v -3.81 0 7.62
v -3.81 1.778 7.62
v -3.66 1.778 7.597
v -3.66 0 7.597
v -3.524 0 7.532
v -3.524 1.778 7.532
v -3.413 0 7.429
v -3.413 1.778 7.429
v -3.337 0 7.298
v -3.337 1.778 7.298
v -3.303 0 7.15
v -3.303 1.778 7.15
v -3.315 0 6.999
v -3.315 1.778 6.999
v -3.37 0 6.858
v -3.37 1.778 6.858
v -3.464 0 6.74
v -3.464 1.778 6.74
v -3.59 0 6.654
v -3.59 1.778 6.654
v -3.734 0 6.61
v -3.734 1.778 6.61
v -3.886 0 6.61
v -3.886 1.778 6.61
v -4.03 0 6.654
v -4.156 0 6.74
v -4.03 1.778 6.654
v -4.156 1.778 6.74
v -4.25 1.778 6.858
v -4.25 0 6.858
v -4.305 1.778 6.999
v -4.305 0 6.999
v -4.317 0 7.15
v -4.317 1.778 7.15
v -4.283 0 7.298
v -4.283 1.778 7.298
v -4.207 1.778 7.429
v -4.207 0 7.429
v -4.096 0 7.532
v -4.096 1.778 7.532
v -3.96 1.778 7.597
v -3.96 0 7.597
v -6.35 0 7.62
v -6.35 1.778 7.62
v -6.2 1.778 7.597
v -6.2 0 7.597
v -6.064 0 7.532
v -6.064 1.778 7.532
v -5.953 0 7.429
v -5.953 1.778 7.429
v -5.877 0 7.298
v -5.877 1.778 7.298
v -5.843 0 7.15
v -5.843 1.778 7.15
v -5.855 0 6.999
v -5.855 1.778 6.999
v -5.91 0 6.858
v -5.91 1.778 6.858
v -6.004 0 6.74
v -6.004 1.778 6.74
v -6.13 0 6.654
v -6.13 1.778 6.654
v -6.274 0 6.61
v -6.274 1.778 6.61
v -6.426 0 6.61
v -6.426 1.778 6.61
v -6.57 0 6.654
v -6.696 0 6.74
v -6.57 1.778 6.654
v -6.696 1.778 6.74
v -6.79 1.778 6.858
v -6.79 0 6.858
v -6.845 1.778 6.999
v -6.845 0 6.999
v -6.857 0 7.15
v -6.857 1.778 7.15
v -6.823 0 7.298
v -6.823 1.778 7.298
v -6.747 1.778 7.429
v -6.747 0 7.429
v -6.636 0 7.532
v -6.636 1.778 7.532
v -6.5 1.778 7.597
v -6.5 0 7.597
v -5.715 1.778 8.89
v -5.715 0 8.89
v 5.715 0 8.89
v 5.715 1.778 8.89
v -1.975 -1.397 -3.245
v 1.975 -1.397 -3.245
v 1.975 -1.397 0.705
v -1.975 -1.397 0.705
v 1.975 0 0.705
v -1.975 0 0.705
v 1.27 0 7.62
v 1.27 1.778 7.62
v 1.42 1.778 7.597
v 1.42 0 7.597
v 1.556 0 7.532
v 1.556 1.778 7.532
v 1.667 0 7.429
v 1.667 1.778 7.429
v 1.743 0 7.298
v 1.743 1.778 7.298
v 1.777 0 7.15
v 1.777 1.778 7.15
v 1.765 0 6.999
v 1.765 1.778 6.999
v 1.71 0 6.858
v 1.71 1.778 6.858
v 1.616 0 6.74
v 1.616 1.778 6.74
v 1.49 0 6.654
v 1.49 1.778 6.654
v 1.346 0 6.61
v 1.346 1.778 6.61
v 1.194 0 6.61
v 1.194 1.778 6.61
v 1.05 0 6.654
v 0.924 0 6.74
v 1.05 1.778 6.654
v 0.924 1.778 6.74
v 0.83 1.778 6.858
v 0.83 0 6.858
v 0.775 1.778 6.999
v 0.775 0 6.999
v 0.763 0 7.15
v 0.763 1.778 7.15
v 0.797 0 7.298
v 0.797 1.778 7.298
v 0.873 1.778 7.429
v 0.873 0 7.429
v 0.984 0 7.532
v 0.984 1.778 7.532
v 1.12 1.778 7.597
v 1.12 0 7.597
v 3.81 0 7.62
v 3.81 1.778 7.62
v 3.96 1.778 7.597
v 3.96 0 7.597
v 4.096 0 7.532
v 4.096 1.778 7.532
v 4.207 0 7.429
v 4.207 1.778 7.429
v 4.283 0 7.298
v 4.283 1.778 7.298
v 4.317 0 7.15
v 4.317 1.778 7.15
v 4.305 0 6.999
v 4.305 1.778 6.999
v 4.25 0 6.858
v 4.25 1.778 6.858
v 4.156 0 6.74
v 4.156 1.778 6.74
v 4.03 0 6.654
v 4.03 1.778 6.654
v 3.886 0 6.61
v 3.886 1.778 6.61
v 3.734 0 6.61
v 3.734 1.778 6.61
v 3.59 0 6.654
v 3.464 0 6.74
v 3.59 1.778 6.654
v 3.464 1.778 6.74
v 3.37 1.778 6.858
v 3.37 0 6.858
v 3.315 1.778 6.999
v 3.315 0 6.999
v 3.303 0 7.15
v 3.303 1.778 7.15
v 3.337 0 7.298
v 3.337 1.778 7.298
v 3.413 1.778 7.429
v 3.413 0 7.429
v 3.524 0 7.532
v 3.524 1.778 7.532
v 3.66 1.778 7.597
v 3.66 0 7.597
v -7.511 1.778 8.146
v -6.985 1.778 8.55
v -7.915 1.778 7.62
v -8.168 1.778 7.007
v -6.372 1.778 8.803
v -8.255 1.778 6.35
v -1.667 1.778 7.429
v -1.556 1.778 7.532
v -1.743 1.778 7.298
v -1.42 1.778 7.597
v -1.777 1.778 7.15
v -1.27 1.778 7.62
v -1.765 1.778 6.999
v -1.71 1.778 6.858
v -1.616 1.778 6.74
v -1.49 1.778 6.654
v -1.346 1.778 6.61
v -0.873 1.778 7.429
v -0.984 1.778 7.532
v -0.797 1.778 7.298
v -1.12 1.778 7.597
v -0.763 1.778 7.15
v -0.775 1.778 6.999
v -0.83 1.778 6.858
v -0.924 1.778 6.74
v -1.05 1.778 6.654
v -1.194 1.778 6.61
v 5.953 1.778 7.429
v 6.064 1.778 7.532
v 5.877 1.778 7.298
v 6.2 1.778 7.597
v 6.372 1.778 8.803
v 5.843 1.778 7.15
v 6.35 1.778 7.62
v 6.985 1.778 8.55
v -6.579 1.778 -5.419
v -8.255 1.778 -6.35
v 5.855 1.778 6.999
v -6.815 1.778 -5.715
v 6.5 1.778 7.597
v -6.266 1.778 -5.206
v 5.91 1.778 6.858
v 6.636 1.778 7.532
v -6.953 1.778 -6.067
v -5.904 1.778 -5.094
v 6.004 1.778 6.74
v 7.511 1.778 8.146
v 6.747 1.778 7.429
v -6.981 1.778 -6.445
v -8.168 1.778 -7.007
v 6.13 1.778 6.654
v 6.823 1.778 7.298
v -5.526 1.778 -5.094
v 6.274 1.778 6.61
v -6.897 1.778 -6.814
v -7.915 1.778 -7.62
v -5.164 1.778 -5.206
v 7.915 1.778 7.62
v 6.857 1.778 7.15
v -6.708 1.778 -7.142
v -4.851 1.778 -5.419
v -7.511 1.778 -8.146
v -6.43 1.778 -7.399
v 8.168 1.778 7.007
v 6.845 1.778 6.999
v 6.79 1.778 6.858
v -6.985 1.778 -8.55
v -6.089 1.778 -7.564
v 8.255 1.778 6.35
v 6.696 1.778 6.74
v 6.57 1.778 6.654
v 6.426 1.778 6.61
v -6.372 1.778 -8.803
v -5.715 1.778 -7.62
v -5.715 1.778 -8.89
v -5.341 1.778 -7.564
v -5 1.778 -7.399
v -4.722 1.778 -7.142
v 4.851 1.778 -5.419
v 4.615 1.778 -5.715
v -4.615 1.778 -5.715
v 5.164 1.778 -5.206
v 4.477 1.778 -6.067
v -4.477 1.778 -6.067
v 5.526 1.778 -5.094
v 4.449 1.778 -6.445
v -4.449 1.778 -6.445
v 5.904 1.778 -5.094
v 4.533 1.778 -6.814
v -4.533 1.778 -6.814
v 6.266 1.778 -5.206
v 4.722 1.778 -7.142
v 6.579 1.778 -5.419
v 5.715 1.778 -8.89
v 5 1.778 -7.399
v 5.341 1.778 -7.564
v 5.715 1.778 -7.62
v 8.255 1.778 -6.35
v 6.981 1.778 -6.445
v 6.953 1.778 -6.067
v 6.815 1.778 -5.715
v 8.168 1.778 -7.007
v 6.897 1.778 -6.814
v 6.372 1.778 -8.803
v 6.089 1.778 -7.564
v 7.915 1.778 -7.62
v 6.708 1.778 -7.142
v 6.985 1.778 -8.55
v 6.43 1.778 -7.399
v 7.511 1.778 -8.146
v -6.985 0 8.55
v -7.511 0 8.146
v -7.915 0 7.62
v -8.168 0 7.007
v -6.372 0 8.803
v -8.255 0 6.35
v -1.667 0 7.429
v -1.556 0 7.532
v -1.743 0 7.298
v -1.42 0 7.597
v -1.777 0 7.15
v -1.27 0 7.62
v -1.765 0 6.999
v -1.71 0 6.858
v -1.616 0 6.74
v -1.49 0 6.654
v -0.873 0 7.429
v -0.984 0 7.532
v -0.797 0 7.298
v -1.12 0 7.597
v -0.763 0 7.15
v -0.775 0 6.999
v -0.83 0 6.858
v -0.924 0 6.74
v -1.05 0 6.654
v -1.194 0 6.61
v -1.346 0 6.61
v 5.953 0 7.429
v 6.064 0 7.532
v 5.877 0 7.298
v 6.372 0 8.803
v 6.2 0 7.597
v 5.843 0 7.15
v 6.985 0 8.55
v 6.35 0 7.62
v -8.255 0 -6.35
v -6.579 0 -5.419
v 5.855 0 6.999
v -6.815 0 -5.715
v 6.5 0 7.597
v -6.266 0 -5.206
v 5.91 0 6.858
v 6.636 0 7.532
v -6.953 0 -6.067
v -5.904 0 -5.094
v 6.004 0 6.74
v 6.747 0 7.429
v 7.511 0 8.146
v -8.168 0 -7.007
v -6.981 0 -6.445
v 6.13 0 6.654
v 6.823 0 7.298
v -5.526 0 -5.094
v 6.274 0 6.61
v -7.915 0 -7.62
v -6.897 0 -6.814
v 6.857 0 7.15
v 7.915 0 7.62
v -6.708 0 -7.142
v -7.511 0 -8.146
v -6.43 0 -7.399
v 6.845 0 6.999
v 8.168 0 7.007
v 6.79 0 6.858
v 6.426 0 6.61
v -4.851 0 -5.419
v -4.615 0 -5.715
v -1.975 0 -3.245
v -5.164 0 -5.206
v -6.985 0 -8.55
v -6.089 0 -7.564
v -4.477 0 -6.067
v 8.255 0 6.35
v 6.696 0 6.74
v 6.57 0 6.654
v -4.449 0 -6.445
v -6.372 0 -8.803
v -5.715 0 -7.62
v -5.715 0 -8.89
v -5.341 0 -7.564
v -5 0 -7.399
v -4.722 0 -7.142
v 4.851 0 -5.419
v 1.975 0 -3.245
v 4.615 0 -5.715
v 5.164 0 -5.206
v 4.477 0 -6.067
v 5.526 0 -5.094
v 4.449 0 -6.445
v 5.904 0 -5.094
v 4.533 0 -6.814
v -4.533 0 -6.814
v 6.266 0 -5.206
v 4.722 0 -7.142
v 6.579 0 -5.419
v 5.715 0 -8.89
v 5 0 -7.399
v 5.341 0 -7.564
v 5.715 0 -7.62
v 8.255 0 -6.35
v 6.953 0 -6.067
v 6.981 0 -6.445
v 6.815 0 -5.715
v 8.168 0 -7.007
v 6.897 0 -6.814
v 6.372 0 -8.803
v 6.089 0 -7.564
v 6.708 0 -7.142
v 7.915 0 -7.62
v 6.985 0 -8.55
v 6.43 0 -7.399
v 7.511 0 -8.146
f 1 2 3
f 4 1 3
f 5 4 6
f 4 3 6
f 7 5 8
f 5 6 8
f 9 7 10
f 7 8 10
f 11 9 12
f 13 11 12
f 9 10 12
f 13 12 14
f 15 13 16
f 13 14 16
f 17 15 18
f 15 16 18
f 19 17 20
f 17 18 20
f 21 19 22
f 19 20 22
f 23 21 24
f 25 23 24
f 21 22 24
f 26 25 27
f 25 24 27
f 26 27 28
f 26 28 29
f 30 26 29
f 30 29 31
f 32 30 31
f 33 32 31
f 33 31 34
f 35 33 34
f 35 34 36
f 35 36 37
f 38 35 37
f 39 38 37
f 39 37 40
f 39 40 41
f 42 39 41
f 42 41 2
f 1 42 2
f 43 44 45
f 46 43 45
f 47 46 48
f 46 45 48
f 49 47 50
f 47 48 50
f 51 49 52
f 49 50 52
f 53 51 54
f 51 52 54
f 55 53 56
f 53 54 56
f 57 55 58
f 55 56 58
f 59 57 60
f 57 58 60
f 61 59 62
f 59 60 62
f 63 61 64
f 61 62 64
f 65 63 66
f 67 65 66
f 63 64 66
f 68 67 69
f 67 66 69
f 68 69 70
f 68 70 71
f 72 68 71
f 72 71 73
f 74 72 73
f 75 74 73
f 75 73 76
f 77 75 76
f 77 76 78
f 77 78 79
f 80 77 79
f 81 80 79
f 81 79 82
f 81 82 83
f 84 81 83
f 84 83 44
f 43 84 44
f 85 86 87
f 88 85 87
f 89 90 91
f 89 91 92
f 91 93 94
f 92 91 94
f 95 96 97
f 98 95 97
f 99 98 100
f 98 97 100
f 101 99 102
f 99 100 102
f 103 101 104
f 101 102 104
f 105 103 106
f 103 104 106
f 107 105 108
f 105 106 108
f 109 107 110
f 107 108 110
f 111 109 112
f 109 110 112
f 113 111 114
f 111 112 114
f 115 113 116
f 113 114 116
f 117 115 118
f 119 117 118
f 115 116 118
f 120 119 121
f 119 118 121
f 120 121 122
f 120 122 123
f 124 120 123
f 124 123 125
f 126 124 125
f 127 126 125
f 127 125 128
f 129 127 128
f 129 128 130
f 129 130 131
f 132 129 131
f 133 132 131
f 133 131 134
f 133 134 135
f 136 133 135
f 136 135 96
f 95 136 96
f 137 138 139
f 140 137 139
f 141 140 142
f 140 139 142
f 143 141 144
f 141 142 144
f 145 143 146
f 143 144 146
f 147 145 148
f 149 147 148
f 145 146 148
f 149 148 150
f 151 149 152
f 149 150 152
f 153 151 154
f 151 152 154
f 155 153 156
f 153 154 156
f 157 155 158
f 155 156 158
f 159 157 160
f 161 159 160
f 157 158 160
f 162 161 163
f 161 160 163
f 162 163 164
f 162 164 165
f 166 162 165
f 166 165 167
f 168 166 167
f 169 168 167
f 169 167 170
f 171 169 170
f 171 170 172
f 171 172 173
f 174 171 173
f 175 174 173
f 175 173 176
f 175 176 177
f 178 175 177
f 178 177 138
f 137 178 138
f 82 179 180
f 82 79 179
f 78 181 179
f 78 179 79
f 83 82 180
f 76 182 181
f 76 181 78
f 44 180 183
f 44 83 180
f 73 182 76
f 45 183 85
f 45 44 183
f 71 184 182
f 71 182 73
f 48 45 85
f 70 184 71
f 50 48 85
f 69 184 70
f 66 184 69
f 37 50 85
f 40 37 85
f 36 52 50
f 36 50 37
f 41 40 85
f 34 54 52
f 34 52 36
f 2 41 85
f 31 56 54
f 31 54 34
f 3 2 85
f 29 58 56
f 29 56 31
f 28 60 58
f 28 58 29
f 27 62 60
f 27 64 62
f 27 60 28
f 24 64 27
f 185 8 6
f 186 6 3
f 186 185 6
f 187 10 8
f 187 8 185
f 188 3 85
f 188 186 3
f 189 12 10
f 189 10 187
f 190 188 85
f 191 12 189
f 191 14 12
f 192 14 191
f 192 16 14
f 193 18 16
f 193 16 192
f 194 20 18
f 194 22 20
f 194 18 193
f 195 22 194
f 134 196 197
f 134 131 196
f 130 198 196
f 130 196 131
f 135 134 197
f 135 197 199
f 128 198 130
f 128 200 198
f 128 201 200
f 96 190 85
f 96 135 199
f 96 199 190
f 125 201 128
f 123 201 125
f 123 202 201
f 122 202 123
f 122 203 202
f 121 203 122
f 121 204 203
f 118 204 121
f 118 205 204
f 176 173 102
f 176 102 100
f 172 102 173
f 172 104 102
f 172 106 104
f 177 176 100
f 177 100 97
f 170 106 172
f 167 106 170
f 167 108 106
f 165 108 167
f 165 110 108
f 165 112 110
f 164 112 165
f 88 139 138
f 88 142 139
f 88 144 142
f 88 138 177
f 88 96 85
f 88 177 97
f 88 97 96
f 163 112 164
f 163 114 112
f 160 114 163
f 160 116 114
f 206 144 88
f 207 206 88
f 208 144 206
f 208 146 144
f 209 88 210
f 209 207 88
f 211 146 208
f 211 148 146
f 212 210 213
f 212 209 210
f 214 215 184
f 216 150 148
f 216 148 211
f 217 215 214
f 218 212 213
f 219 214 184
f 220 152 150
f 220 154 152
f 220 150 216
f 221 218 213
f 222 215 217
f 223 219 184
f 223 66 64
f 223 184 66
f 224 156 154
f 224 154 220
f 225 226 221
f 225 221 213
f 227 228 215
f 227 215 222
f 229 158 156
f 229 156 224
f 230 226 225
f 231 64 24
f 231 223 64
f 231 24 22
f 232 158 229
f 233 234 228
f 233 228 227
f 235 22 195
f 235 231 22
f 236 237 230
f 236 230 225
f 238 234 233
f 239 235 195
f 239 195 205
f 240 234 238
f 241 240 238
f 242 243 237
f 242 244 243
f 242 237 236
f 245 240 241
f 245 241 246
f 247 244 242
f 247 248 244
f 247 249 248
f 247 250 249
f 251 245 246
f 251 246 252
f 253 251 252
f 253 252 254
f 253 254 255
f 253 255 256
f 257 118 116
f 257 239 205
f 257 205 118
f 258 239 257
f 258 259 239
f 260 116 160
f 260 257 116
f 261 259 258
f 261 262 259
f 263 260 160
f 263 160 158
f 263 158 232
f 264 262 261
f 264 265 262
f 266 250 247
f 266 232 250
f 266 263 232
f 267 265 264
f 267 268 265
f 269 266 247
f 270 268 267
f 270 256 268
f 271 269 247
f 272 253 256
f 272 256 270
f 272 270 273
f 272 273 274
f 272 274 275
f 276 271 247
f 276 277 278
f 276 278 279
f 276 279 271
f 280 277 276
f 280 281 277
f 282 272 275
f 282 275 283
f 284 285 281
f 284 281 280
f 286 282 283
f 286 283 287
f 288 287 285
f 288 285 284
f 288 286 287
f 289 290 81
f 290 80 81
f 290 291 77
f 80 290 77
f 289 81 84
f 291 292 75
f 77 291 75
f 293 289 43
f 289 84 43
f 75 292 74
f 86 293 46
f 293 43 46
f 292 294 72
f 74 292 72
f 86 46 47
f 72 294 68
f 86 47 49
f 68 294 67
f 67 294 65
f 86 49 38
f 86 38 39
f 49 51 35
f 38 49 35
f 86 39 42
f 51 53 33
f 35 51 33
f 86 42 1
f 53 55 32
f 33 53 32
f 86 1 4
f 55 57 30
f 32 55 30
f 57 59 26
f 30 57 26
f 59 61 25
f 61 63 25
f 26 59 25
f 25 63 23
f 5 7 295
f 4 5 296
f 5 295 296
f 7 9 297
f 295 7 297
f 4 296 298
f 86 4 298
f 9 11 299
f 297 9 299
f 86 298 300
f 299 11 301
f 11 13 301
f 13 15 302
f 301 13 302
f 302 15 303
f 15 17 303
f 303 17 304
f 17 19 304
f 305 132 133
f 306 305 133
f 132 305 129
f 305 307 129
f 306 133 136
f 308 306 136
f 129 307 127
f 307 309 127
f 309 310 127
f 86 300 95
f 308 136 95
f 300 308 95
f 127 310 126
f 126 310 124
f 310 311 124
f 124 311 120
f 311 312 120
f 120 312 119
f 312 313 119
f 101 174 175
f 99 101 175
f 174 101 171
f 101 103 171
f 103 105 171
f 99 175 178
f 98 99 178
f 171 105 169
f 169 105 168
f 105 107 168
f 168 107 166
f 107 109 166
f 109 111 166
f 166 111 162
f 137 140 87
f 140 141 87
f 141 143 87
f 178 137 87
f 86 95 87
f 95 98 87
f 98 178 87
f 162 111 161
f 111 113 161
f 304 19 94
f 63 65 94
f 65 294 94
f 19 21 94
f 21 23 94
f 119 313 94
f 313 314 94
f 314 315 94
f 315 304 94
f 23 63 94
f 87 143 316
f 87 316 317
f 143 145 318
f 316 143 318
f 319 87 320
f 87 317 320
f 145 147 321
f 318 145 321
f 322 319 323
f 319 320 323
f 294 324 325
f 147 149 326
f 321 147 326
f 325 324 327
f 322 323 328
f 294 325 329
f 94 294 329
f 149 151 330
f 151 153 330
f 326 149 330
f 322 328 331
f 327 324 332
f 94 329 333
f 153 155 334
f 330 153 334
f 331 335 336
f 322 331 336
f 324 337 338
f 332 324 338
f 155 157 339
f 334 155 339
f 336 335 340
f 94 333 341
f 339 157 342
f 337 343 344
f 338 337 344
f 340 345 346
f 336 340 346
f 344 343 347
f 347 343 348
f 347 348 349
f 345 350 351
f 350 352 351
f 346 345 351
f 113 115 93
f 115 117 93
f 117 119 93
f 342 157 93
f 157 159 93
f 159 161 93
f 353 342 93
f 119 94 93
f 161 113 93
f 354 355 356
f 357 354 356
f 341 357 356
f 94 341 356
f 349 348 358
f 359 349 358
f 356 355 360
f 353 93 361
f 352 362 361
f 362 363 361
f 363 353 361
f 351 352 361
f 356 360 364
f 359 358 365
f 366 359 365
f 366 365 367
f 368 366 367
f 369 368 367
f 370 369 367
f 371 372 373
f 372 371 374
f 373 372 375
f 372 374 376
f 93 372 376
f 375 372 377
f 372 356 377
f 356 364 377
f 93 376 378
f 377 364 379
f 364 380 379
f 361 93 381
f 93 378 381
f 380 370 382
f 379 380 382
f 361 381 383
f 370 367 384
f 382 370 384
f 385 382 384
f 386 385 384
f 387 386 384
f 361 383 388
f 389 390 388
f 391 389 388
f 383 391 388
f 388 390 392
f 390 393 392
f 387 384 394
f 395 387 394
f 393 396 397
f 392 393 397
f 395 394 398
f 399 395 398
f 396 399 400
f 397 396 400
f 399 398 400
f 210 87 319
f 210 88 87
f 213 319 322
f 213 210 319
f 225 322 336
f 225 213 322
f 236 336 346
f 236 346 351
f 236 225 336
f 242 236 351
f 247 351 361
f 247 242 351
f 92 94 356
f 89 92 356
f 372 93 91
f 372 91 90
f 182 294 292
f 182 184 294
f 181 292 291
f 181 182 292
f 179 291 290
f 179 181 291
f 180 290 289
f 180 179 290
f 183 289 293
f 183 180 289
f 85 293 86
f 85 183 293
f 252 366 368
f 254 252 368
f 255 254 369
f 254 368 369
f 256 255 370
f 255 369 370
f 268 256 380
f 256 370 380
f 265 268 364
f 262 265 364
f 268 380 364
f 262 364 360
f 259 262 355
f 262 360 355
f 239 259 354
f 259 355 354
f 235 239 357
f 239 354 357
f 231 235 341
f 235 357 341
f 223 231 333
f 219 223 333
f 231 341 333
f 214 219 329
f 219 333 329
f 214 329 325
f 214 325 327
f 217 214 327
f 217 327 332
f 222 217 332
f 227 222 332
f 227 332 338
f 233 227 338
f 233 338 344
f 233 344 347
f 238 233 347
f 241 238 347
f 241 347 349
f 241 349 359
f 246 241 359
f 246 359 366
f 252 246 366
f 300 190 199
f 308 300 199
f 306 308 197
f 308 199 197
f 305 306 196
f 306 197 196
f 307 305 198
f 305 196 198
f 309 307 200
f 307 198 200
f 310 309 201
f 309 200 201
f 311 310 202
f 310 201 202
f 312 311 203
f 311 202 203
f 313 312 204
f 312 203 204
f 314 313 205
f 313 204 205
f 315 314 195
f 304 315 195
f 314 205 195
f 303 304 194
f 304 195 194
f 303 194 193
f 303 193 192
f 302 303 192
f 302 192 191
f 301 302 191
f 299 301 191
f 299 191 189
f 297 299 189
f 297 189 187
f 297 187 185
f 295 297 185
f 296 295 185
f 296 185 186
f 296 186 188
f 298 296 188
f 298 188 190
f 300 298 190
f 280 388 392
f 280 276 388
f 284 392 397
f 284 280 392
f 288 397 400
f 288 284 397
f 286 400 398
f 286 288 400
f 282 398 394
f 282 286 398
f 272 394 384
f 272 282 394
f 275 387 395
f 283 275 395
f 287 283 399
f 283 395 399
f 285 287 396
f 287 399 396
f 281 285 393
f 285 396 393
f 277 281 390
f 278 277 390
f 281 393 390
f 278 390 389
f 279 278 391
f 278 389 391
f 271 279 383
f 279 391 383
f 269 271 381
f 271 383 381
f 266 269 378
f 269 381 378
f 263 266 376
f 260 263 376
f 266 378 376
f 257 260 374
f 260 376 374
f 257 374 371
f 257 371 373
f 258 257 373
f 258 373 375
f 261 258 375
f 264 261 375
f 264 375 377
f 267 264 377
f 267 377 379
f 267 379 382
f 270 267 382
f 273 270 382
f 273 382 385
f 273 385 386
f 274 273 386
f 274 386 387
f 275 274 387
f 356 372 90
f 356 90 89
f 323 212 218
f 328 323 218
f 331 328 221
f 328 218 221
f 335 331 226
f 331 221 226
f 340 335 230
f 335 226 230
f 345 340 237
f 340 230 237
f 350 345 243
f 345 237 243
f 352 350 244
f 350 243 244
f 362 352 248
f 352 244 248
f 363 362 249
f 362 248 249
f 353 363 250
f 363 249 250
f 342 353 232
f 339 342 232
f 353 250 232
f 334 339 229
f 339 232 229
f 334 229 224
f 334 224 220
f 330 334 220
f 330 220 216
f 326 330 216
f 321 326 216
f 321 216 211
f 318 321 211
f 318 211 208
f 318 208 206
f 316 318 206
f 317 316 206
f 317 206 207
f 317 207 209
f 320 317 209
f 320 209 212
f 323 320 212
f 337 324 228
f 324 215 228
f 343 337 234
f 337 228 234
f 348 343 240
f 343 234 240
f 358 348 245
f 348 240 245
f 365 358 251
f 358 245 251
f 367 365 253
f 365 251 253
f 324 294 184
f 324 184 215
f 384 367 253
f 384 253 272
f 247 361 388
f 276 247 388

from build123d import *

# Parameters (mm, degrees)
SKETCH1_W           = 16.51
SKETCH1_H           = 17.78
BOSS_EXTRUDE1_DEPTH = 1.778
FILLET1_R           = 2.54
CUT_EXTRUDE1_REACH  = 14.261
SKETCH2_R           = 0.508
SKETCH4_W           = 3.95
SKETCH4_H           = 3.95
BOSS_EXTRUDE3_DEPTH = 1.397
CUT_EXTRUDE2_REACH  = 14.261
SKETCH5_R           = 1.27


with BuildPart() as part:
    # Sketch1 → Boss-Extrude1 (new body)
    with BuildSketch(Plane(origin=(0, 0, 0), x_dir=(1, 0, 0), z_dir=(0, 1, 0))):
        Rectangle(SKETCH1_W, SKETCH1_H)
    extrude(amount=BOSS_EXTRUDE1_DEPTH)

    # Fillet1
    fillet1_edges = [part.edges().sort_by_distance(p)[0] for p in [
        (8.255, 0.889, 8.89),
        (-8.255, 0.889, 8.89),
        (-8.255, 0.889, -8.89),
        (8.255, 0.889, -8.89),
    ]]
    fillet(fillet1_edges, radius=FILLET1_R)

    # Sketch2 → Cut-Extrude1 (cut, up to next)
    with BuildSketch(Plane(origin=(0, 1.778, 0), x_dir=(1, 0, 0), z_dir=(0, 1, 0)), mode=Mode.PRIVATE) as cut_extrude1_sk1:
        with Locations(Location((-6.35, -7.112, 0), (0, 0, 270))):
            Circle(SKETCH2_R)
    cut_extrude1_tool1 = extrude(cut_extrude1_sk1.sketch, amount=-CUT_EXTRUDE1_REACH, mode=Mode.PRIVATE) & part.part
    # Sketch2 → Cut-Extrude1 (cut, up to next)
    with BuildSketch(Plane(origin=(0, 1.778, 0), x_dir=(1, 0, 0), z_dir=(0, 1, 0)), mode=Mode.PRIVATE) as cut_extrude1_sk2:
        with Locations(Location((-3.81, -7.112, 0), (0, 0, 270))):
            Circle(SKETCH2_R)
    cut_extrude1_tool2 = extrude(cut_extrude1_sk2.sketch, amount=-CUT_EXTRUDE1_REACH, mode=Mode.PRIVATE) & part.part
    # Sketch2 → Cut-Extrude1 (cut, up to next)
    with BuildSketch(Plane(origin=(0, 1.778, 0), x_dir=(1, 0, 0), z_dir=(0, 1, 0)), mode=Mode.PRIVATE) as cut_extrude1_sk3:
        with Locations(Location((-1.27, -7.112, 0), (0, 0, 270))):
            Circle(SKETCH2_R)
    cut_extrude1_tool3 = extrude(cut_extrude1_sk3.sketch, amount=-CUT_EXTRUDE1_REACH, mode=Mode.PRIVATE) & part.part
    # Sketch2 → Cut-Extrude1 (cut, up to next)
    with BuildSketch(Plane(origin=(0, 1.778, 0), x_dir=(1, 0, 0), z_dir=(0, 1, 0)), mode=Mode.PRIVATE) as cut_extrude1_sk4:
        with Locations(Location((1.27, -7.112, 0), (0, 0, 270))):
            Circle(SKETCH2_R)
    cut_extrude1_tool4 = extrude(cut_extrude1_sk4.sketch, amount=-CUT_EXTRUDE1_REACH, mode=Mode.PRIVATE) & part.part
    # Sketch2 → Cut-Extrude1 (cut, up to next)
    with BuildSketch(Plane(origin=(0, 1.778, 0), x_dir=(1, 0, 0), z_dir=(0, 1, 0)), mode=Mode.PRIVATE) as cut_extrude1_sk5:
        with Locations(Location((3.81, -7.112, 0), (0, 0, 270))):
            Circle(SKETCH2_R)
    cut_extrude1_tool5 = extrude(cut_extrude1_sk5.sketch, amount=-CUT_EXTRUDE1_REACH, mode=Mode.PRIVATE) & part.part
    # Sketch2 → Cut-Extrude1 (cut, up to next)
    with BuildSketch(Plane(origin=(0, 1.778, 0), x_dir=(1, 0, 0), z_dir=(0, 1, 0)), mode=Mode.PRIVATE) as cut_extrude1_sk6:
        with Locations(Location((6.35, -7.112, 0), (0, 0, 270))):
            Circle(SKETCH2_R)
    cut_extrude1_tool6 = extrude(cut_extrude1_sk6.sketch, amount=-CUT_EXTRUDE1_REACH, mode=Mode.PRIVATE) & part.part
    add(cut_extrude1_tool1.solids().sort_by_distance((-6.35, 1.778, 7.112))[0], mode=Mode.SUBTRACT)
    add(cut_extrude1_tool2.solids().sort_by_distance((-3.81, 1.778, 7.112))[0], mode=Mode.SUBTRACT)
    add(cut_extrude1_tool3.solids().sort_by_distance((-1.27, 1.778, 7.112))[0], mode=Mode.SUBTRACT)
    add(cut_extrude1_tool4.solids().sort_by_distance((1.27, 1.778, 7.112))[0], mode=Mode.SUBTRACT)
    add(cut_extrude1_tool5.solids().sort_by_distance((3.81, 1.778, 7.112))[0], mode=Mode.SUBTRACT)
    add(cut_extrude1_tool6.solids().sort_by_distance((6.35, 1.778, 7.112))[0], mode=Mode.SUBTRACT)

    # Sketch4 → Boss-Extrude3 (add)
    with BuildSketch(Plane(origin=(0, 0, 0), x_dir=(-1, 0, 0), z_dir=(0, -1, 0))):
        with Locations((0, 1.27)):
            Rectangle(SKETCH4_W, SKETCH4_H)
    extrude(amount=BOSS_EXTRUDE3_DEPTH)

    # Sketch5 → Cut-Extrude2 (cut, up to next)
    with BuildSketch(Plane(origin=(0, 0, 0), x_dir=(-1, 0, 0), z_dir=(0, -1, 0)), mode=Mode.PRIVATE) as cut_extrude2_sk1:
        with Locations(Location((-5.715, 6.35, 0), (0, 0, 90))):
            Circle(SKETCH5_R)
    cut_extrude2_tool1 = extrude(cut_extrude2_sk1.sketch, amount=-CUT_EXTRUDE2_REACH, mode=Mode.PRIVATE) & part.part
    # Sketch5 → Cut-Extrude2 (cut, up to next)
    with BuildSketch(Plane(origin=(0, 0, 0), x_dir=(-1, 0, 0), z_dir=(0, -1, 0)), mode=Mode.PRIVATE) as cut_extrude2_sk2:
        with Locations(Location((5.715, 6.35, 0), (0, 0, 90))):
            Circle(SKETCH5_R)
    cut_extrude2_tool2 = extrude(cut_extrude2_sk2.sketch, amount=-CUT_EXTRUDE2_REACH, mode=Mode.PRIVATE) & part.part
    add(cut_extrude2_tool1.solids().sort_by_distance((5.715, 0, -6.35))[0], mode=Mode.SUBTRACT)
    add(cut_extrude2_tool2.solids().sort_by_distance((-5.715, 0, -6.35))[0], mode=Mode.SUBTRACT)


solid = part.part
